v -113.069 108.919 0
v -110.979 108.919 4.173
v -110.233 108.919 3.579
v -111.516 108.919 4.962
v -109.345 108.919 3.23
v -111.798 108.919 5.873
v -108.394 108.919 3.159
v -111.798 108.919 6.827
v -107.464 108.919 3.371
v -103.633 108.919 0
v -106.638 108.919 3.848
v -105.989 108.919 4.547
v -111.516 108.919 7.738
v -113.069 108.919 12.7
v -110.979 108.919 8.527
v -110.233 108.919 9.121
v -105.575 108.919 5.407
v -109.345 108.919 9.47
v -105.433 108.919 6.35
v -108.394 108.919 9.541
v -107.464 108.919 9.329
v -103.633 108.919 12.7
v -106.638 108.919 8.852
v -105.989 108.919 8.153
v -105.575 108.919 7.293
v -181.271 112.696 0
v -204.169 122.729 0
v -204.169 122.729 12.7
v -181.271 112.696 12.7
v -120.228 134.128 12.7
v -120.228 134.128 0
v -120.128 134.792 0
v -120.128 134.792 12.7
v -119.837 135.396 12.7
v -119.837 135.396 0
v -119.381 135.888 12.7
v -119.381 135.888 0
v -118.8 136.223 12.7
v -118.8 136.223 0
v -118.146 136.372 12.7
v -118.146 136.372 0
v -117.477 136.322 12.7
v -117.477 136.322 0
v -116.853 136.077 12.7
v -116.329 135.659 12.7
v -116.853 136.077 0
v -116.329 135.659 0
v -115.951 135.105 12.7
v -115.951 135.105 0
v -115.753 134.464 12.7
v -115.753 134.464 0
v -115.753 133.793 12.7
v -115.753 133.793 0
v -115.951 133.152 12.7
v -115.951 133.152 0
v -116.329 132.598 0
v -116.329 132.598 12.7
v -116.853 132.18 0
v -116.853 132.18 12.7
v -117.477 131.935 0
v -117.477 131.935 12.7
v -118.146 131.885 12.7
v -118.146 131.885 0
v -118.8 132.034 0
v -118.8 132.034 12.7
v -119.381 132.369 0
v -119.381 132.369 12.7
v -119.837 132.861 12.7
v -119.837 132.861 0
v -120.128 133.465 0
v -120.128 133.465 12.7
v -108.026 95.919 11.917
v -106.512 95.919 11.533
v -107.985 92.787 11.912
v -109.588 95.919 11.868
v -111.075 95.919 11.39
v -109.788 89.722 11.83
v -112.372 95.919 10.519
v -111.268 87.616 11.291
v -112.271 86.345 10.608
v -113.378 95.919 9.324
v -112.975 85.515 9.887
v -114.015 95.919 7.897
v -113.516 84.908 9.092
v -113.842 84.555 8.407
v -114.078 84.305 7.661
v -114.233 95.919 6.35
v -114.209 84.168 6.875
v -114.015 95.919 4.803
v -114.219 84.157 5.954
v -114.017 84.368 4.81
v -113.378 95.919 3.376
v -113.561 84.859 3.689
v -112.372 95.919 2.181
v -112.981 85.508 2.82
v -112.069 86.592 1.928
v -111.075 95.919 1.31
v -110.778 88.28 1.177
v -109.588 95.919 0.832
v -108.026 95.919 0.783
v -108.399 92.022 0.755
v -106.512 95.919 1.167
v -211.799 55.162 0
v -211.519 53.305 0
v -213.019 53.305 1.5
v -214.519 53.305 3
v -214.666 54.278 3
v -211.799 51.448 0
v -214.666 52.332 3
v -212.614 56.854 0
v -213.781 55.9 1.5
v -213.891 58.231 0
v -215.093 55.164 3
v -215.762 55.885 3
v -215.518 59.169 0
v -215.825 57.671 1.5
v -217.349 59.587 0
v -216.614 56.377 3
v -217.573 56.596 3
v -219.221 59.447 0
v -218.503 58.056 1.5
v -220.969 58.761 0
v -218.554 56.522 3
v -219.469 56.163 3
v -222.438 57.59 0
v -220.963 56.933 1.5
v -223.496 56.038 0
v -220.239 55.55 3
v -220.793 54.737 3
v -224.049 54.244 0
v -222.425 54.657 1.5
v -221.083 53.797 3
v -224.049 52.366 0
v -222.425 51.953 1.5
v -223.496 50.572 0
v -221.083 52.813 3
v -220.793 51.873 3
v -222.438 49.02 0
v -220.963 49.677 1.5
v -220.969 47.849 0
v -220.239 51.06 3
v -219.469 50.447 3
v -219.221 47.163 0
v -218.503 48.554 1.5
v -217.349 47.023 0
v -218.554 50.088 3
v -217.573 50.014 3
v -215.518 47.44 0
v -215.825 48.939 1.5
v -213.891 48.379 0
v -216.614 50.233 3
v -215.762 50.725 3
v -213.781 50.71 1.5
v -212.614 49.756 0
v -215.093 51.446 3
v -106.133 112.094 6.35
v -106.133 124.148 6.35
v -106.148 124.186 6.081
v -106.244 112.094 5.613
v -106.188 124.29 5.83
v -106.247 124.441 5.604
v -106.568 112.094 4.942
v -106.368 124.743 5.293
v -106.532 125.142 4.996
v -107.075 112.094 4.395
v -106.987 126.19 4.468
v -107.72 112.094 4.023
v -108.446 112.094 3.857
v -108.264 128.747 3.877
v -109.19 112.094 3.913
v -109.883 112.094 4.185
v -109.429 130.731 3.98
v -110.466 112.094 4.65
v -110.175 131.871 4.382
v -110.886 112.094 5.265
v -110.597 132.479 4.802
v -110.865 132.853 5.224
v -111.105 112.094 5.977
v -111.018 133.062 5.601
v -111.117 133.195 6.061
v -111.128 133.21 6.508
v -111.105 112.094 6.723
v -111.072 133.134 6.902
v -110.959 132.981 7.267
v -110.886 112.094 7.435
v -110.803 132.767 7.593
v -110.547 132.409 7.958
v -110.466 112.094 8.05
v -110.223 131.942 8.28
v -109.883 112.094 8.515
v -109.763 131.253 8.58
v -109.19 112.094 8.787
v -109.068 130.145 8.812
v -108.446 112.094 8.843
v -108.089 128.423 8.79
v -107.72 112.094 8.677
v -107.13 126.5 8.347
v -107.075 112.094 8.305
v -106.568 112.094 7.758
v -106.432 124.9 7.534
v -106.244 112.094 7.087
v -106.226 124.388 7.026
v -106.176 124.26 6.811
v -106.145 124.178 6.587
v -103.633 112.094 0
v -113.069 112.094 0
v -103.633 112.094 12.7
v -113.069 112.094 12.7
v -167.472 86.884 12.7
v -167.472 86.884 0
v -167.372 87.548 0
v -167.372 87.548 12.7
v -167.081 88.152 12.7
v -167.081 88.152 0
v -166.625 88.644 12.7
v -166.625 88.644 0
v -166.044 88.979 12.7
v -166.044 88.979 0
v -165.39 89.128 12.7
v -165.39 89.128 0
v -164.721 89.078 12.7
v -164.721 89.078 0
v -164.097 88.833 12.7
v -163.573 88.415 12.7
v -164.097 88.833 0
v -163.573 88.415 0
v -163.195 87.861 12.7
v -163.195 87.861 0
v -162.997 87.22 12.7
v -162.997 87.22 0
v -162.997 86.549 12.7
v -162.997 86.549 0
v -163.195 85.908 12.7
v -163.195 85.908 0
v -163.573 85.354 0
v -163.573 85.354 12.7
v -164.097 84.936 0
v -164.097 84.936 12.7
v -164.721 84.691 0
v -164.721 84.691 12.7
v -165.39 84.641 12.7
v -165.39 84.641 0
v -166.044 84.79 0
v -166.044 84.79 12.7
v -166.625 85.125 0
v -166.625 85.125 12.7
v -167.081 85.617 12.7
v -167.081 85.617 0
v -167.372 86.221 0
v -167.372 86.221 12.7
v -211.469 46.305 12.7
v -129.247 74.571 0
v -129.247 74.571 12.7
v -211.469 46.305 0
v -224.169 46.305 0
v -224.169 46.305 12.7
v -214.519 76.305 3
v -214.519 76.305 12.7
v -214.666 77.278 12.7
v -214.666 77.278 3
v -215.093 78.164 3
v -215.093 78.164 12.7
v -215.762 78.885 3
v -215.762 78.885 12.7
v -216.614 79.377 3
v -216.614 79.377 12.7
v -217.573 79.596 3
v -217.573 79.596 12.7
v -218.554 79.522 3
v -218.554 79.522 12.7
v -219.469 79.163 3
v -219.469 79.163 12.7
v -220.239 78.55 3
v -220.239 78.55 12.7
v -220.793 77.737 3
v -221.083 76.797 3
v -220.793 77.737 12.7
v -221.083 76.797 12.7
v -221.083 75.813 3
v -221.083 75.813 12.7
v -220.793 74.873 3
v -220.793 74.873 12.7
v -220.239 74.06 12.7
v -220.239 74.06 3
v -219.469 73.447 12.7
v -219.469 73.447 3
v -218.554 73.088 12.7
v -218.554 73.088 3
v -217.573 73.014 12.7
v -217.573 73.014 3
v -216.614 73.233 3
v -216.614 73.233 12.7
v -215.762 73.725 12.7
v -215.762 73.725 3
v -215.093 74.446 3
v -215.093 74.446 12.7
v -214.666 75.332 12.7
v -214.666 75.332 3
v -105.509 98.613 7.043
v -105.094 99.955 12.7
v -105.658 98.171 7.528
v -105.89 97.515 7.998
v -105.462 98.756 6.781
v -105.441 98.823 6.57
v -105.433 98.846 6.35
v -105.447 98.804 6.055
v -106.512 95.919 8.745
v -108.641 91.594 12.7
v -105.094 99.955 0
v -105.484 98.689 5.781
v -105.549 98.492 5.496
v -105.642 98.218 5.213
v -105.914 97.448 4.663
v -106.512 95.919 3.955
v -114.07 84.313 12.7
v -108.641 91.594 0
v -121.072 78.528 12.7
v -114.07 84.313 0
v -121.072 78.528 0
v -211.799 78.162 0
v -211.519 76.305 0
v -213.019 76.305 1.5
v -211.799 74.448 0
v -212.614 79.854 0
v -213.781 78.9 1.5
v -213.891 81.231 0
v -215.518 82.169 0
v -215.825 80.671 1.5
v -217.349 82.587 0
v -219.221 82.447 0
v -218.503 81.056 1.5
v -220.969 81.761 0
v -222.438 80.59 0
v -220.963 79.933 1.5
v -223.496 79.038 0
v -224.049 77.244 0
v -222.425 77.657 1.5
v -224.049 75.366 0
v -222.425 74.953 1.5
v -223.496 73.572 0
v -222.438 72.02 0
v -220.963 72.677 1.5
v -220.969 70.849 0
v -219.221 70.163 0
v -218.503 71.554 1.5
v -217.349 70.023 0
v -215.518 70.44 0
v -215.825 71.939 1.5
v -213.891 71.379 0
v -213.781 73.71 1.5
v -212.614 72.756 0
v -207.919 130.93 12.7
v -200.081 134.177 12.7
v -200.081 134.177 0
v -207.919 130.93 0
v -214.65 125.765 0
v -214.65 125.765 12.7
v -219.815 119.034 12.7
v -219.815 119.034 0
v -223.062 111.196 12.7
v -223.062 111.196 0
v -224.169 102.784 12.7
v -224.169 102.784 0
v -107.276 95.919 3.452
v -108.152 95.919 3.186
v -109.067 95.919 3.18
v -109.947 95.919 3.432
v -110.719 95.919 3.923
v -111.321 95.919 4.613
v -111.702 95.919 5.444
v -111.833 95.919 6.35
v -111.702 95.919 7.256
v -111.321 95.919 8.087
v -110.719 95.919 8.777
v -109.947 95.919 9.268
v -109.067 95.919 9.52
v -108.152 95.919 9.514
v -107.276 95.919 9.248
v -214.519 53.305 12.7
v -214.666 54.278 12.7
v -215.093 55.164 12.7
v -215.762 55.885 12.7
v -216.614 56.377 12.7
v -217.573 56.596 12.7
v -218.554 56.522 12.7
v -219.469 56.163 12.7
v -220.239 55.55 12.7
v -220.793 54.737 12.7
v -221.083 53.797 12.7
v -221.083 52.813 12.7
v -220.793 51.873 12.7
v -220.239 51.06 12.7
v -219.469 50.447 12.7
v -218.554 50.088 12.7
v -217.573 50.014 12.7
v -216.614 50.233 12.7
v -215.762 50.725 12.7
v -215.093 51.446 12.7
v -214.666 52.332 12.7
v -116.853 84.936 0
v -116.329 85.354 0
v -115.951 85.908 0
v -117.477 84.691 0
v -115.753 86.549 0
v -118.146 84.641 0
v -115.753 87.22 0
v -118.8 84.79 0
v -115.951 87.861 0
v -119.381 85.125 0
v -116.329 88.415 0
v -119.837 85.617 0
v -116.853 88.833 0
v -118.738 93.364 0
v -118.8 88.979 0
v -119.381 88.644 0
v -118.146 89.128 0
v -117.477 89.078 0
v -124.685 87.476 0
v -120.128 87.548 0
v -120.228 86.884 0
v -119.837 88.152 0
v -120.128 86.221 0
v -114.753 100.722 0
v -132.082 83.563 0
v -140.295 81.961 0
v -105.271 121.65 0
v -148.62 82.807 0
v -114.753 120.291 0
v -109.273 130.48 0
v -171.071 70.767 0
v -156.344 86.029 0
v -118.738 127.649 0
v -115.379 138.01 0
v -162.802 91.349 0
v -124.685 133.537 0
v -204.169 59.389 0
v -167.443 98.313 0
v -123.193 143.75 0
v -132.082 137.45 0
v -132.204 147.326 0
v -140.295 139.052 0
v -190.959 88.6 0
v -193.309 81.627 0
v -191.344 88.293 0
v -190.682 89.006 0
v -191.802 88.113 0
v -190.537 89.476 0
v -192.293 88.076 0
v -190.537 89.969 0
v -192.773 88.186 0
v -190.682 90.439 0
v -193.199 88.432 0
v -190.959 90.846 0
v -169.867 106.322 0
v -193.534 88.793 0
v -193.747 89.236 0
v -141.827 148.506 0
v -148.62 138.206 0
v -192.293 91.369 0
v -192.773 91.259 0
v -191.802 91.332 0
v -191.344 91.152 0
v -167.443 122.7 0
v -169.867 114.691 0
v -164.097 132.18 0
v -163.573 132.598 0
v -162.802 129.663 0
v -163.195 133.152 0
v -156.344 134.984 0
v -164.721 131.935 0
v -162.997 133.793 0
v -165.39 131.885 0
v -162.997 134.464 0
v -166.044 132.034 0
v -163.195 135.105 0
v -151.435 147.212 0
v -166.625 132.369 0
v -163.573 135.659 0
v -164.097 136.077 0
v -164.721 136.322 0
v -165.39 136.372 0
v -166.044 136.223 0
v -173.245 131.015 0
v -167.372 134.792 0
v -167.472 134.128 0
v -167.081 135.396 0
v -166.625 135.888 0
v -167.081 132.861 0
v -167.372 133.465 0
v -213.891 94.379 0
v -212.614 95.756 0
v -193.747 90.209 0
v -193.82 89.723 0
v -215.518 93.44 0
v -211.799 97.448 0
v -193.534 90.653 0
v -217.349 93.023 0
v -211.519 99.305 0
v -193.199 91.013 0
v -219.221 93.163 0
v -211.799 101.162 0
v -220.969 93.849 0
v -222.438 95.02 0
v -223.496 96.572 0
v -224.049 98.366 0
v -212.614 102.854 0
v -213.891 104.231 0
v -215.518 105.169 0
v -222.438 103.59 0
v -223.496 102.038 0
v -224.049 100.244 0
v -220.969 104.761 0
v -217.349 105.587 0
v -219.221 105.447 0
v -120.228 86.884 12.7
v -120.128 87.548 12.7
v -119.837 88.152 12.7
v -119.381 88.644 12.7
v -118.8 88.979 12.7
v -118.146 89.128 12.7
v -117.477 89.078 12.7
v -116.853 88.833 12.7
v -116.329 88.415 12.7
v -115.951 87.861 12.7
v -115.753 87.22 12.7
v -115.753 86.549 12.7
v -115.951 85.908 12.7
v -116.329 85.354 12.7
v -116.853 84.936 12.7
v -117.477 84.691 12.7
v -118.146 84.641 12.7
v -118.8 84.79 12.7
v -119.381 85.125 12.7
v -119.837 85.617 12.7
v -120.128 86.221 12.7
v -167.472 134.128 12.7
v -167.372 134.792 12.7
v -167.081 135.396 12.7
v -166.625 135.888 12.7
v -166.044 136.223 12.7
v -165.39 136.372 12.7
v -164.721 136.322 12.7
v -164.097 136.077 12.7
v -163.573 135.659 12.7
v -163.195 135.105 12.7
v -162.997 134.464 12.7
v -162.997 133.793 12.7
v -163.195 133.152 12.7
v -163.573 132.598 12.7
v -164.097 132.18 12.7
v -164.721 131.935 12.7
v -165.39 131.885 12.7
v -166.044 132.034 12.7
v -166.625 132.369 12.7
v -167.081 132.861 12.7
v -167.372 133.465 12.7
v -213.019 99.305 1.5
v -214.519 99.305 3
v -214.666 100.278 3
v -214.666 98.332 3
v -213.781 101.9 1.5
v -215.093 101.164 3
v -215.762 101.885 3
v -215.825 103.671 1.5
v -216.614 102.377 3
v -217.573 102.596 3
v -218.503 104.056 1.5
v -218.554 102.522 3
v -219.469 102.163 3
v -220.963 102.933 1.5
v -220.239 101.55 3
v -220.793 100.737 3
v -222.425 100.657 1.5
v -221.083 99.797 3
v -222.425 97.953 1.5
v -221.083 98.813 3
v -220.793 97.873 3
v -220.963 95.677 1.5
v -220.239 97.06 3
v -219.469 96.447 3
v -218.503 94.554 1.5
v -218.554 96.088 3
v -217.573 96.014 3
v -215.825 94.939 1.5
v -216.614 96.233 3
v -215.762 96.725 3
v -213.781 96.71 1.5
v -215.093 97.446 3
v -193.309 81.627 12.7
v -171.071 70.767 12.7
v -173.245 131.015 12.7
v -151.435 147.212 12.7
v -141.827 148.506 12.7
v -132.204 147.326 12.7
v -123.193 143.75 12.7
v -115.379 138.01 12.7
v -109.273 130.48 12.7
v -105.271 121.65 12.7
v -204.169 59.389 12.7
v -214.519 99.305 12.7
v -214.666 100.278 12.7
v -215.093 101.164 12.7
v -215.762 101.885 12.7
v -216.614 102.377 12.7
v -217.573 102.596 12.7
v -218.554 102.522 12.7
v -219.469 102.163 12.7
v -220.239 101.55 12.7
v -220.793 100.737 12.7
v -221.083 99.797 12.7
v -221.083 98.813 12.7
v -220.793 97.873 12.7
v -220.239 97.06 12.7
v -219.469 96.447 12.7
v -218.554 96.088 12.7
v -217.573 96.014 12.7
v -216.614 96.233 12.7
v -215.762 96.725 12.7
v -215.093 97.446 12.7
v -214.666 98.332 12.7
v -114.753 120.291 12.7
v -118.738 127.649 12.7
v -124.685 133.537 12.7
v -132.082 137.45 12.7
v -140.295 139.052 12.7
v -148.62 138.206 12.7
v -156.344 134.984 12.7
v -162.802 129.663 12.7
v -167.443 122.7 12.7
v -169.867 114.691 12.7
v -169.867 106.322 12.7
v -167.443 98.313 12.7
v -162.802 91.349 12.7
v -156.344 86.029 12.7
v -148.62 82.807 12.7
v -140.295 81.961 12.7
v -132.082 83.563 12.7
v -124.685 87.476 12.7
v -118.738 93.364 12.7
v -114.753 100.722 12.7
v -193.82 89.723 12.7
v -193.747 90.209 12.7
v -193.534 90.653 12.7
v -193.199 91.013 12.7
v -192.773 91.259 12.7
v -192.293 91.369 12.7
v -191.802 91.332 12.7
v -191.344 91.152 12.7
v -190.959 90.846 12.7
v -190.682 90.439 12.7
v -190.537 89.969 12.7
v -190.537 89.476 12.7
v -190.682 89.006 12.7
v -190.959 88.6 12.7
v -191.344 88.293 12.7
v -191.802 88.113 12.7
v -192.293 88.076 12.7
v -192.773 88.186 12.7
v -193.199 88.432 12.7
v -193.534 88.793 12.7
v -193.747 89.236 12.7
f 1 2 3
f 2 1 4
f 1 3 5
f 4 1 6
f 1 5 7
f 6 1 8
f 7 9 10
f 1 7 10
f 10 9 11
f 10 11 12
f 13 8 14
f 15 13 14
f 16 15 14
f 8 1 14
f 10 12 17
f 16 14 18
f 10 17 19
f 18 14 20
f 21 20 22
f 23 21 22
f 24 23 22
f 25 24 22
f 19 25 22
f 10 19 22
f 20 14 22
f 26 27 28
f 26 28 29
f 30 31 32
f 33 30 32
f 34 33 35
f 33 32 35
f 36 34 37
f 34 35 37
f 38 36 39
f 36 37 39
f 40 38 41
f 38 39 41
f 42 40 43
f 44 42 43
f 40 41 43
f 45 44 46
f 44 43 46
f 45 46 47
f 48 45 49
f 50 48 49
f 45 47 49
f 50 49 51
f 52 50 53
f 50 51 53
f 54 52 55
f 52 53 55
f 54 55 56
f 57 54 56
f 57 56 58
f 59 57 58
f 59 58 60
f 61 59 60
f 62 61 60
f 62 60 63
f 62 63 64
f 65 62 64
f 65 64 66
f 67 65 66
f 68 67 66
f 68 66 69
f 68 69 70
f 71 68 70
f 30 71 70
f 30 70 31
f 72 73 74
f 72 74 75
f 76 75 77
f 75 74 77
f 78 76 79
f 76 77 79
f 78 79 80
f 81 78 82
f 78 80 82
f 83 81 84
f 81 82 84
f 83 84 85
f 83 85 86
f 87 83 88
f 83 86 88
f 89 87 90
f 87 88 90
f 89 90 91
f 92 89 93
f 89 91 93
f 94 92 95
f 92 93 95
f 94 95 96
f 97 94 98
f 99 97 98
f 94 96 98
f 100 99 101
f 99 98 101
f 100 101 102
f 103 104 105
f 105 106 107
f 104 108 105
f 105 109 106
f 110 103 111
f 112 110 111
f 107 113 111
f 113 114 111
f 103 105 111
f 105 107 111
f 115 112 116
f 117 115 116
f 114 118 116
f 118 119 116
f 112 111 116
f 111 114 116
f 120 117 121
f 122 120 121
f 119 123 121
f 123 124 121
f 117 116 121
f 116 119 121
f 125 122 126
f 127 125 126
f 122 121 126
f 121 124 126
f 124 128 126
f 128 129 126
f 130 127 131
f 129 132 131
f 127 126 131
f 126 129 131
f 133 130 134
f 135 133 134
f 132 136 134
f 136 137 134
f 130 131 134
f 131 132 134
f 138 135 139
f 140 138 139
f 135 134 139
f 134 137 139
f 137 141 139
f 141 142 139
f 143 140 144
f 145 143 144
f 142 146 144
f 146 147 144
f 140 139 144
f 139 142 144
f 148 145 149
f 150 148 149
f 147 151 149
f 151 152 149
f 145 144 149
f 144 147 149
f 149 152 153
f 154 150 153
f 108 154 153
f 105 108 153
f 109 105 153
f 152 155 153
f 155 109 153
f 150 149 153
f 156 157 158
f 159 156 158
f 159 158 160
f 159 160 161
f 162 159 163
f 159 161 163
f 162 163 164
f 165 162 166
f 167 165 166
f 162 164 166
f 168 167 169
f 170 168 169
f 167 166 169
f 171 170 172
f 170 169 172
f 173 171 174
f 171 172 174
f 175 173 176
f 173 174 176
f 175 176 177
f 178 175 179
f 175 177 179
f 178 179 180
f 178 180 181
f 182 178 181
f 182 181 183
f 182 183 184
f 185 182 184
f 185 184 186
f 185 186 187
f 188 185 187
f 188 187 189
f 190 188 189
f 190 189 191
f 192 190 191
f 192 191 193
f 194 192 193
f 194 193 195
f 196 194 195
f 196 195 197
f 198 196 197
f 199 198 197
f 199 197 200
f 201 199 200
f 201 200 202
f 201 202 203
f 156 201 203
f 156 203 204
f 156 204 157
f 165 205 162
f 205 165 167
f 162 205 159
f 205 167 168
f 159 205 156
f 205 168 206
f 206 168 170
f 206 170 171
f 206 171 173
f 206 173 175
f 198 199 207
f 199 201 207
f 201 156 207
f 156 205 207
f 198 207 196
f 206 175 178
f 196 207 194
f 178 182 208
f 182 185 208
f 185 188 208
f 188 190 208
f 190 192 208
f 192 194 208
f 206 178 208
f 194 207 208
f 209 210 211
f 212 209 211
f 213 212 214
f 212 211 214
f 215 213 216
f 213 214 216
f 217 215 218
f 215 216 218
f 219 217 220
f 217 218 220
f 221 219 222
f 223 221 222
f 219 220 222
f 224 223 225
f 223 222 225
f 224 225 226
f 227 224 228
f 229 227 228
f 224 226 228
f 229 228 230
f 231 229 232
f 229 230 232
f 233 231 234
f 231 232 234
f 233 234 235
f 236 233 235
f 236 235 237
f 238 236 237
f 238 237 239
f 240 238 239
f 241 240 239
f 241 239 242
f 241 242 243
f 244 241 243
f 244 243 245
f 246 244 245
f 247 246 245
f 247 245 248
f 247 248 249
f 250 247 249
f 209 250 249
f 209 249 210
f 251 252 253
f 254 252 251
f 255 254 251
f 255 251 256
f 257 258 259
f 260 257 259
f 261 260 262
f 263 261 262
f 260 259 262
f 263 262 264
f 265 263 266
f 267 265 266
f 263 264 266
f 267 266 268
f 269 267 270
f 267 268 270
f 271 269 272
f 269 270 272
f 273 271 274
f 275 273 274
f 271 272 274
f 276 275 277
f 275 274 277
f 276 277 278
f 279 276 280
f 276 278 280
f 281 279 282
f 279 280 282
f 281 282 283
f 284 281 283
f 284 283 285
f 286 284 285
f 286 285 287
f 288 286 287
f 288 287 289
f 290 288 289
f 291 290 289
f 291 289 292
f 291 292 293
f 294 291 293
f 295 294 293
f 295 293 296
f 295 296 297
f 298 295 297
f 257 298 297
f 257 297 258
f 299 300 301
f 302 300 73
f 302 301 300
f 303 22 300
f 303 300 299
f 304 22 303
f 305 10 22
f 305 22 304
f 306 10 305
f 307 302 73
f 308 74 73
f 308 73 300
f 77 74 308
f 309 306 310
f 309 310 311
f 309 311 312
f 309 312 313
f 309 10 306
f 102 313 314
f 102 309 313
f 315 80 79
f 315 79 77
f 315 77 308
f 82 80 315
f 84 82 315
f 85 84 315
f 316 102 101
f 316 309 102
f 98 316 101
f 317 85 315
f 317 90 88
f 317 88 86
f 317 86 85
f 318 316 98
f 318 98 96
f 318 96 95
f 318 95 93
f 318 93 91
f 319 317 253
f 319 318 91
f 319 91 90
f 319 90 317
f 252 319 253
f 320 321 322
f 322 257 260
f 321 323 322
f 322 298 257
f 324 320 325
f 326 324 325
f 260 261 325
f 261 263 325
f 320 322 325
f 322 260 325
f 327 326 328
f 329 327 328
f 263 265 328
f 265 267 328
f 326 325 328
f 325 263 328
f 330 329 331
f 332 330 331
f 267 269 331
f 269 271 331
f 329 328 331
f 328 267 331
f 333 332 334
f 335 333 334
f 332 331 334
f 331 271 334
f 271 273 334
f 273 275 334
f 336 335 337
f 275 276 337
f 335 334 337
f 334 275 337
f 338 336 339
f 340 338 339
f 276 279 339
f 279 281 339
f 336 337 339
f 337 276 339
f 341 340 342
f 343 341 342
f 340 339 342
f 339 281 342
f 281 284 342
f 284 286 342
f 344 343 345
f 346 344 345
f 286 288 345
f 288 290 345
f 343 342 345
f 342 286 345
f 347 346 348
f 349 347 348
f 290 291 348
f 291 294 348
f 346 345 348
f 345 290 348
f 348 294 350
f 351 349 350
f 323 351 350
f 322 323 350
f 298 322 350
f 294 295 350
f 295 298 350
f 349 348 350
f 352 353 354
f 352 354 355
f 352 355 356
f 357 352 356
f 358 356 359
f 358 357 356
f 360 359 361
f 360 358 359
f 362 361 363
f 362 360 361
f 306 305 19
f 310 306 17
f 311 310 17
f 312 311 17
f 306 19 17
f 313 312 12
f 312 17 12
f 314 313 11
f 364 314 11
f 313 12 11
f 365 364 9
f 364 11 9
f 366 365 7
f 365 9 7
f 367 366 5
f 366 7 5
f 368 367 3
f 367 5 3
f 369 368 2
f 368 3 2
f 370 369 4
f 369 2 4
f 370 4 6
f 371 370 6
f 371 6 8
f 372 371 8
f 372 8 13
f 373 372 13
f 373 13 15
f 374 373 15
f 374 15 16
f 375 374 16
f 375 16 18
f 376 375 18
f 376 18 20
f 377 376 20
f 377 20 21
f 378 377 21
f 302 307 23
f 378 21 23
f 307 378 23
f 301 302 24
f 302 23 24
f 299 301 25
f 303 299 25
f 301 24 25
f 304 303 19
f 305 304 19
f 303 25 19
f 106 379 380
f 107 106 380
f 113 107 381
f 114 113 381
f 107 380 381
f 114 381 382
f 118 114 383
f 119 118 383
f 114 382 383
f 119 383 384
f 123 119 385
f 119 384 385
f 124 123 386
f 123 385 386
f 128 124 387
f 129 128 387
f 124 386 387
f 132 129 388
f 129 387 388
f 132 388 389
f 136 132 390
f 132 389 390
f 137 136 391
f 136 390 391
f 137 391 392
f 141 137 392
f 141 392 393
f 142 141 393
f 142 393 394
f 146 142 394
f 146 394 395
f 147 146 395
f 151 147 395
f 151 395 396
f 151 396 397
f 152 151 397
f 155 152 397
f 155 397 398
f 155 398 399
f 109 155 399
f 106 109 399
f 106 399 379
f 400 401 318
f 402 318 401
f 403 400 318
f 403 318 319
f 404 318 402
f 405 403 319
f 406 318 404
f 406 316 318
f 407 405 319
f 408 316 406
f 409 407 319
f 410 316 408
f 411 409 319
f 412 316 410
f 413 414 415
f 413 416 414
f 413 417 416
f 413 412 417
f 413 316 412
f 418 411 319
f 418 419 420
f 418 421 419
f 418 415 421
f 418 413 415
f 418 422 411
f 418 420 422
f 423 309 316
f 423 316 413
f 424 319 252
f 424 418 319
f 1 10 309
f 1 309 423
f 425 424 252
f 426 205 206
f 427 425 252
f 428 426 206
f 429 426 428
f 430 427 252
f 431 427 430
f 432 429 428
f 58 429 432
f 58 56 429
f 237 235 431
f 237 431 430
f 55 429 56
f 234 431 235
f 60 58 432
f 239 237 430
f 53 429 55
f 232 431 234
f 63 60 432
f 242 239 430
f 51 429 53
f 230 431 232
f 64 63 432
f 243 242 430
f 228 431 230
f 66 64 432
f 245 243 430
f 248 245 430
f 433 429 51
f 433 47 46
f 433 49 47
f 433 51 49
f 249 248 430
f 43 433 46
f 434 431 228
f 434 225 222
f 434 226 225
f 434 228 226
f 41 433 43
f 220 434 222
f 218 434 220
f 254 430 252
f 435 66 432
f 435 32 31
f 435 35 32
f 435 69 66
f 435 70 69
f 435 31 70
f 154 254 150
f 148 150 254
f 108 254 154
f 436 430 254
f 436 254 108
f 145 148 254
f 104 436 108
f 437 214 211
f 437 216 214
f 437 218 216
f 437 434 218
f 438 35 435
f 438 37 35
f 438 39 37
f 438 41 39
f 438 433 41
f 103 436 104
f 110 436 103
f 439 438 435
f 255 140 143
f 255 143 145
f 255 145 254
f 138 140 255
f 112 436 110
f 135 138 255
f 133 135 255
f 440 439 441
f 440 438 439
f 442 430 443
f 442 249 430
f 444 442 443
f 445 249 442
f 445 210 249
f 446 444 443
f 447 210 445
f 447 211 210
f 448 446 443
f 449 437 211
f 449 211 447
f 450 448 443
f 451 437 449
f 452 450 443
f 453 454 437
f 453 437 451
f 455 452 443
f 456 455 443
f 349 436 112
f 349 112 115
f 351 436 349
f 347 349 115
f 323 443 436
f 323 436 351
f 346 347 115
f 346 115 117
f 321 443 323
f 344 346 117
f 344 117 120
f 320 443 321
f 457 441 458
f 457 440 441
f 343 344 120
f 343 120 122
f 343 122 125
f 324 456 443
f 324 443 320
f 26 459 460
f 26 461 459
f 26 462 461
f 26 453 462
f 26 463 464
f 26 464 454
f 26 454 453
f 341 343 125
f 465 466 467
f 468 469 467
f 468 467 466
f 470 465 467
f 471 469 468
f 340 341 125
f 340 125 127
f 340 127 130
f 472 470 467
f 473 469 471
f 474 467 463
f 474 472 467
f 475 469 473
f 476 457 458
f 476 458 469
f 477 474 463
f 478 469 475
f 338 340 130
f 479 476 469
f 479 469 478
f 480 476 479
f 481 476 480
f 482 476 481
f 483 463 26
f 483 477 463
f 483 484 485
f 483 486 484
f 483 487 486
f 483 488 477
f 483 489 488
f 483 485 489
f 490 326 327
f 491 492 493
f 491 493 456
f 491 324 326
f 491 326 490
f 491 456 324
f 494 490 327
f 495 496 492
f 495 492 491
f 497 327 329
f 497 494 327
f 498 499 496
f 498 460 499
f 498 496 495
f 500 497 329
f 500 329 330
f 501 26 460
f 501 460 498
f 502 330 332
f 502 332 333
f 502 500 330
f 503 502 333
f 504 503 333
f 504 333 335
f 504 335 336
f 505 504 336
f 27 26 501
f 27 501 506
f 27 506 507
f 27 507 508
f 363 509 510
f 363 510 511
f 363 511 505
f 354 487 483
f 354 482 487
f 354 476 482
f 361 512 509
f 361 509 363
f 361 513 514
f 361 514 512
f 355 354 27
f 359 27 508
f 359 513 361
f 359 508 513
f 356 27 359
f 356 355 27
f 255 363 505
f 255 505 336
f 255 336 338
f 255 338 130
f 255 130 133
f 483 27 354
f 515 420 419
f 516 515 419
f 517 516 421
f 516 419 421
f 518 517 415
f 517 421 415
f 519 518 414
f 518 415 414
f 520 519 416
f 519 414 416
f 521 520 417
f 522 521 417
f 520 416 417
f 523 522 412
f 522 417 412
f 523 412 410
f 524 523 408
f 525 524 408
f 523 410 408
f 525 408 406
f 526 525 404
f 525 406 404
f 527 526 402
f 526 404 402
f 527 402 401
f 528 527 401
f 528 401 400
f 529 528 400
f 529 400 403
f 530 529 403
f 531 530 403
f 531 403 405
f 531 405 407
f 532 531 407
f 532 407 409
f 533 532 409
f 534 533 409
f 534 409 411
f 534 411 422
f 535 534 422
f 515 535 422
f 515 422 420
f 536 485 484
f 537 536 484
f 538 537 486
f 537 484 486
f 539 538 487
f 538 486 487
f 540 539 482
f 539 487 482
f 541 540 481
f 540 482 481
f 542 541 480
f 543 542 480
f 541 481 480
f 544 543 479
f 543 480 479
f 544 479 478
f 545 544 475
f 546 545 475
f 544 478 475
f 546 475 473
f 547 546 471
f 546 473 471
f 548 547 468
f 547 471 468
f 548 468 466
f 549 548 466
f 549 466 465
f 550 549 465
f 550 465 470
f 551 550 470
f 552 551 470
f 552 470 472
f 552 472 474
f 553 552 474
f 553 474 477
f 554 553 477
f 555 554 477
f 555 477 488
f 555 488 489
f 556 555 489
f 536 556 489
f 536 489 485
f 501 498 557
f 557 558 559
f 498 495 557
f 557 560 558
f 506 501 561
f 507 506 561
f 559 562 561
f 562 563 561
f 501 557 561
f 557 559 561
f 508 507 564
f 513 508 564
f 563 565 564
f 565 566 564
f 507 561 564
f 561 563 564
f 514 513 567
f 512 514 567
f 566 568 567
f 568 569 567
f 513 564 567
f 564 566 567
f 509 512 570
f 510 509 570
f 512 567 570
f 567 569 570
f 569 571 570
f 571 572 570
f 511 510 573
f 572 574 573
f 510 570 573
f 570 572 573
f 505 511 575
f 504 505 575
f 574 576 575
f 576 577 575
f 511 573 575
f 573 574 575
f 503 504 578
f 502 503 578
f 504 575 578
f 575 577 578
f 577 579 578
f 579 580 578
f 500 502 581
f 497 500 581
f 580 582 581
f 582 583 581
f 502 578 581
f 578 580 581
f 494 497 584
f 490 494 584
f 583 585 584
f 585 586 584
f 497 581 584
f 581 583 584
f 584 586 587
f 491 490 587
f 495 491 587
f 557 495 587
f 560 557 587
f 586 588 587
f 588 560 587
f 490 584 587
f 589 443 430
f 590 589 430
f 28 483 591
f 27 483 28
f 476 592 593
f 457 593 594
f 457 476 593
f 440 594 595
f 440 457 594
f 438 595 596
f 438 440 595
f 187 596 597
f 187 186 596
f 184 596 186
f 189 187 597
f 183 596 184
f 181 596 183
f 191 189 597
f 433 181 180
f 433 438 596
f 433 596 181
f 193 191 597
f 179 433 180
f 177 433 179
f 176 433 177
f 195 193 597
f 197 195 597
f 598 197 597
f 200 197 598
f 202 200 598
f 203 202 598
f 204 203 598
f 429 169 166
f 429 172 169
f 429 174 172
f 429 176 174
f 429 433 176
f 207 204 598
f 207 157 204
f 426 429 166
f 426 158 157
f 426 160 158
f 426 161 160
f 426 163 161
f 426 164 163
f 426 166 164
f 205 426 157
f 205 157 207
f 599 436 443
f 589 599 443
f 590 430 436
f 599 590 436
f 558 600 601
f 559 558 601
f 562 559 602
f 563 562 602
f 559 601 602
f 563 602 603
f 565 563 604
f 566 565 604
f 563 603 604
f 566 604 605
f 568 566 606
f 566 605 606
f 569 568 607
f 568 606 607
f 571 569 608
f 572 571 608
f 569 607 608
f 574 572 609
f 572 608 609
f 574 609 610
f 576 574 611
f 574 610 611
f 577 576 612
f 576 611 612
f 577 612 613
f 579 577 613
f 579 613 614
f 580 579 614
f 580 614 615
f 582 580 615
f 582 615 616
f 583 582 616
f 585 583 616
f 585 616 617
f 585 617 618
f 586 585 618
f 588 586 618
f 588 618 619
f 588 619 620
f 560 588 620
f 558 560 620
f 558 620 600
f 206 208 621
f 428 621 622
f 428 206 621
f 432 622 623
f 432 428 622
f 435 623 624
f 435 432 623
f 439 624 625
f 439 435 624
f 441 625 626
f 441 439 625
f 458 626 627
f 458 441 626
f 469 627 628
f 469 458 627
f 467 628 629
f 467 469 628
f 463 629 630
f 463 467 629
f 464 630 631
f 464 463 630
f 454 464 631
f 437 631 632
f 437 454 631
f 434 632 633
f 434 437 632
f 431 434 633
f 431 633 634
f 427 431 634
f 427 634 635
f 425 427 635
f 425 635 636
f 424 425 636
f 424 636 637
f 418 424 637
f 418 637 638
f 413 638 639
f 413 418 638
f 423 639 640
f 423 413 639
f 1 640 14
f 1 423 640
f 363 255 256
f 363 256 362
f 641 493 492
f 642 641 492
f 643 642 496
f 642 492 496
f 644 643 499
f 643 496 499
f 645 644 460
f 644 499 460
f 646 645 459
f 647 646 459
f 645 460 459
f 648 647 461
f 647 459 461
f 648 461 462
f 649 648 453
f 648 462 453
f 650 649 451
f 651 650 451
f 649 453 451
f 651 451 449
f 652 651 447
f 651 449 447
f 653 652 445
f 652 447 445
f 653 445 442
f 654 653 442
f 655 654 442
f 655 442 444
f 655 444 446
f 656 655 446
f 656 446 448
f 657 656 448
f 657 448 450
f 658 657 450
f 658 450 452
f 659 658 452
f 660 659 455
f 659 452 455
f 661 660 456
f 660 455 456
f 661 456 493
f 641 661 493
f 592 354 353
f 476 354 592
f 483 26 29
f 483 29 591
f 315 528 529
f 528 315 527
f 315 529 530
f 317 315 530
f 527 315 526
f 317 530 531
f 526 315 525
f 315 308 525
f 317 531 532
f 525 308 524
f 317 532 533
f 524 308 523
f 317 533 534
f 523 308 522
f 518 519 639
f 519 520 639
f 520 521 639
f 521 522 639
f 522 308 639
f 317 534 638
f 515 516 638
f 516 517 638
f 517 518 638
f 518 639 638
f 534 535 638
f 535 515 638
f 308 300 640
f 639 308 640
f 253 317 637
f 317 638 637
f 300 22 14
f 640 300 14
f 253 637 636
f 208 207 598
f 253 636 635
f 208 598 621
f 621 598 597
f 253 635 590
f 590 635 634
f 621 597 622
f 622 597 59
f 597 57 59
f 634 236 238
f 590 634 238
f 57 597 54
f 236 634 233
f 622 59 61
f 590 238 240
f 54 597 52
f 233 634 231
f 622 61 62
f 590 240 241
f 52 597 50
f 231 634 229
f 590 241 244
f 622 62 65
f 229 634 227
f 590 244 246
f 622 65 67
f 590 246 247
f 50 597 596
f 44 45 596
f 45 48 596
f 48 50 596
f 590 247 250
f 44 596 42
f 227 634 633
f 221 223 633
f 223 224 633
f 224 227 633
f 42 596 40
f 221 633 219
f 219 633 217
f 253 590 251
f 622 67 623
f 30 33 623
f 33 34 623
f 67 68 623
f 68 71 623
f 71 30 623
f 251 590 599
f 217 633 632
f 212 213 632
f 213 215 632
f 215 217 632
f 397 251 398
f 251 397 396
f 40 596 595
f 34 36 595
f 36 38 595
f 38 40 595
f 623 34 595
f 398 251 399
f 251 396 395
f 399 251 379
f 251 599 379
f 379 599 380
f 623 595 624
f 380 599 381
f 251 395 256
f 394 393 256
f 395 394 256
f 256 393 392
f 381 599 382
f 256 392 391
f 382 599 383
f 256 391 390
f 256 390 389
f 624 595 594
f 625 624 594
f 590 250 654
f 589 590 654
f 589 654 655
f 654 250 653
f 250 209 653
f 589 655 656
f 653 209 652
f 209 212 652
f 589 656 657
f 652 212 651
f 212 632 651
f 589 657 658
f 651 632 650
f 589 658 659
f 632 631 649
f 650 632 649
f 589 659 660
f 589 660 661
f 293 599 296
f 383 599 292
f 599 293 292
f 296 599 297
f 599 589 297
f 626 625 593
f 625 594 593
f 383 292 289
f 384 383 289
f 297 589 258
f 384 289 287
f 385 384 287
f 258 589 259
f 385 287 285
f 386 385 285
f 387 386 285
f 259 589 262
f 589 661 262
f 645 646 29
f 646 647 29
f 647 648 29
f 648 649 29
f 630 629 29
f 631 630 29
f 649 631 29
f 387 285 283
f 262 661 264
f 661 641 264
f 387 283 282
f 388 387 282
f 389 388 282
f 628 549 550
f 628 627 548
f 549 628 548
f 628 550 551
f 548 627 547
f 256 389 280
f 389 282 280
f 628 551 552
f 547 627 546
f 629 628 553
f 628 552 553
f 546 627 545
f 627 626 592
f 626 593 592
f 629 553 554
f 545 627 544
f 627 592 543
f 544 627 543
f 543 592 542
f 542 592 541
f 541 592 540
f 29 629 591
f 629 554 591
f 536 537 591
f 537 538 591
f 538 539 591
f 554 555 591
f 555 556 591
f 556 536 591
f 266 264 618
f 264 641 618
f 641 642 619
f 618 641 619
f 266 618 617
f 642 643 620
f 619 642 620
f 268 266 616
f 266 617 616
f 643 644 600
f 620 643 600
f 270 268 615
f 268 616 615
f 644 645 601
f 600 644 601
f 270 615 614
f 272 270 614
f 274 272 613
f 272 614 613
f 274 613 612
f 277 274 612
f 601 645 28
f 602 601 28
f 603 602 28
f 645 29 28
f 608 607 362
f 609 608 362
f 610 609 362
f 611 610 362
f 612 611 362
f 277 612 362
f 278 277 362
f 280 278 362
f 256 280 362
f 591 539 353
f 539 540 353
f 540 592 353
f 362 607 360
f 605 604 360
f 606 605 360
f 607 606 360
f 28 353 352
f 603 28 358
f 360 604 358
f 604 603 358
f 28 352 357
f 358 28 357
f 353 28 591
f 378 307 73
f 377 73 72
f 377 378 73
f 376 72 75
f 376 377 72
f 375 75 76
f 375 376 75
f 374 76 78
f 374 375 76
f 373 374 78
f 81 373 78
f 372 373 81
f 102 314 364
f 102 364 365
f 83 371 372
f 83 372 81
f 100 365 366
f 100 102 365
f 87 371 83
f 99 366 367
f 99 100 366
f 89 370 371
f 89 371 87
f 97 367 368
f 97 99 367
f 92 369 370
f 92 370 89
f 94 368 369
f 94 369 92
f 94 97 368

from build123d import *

# Parameters (mm, degrees)
BOSS_EXTRUDE1_DEPTH        = 12.7
CUT_EXTRUDE1_DEPTH         = 270.1976912701424
F_8_CLEARANCE_HOLE1_D      = 4.5
F_1_4_CLEARANCE_HOLE1_D    = 6.6
F_12_CLEARANCE_HOLE1_D     = 6
HOLE1_D                    = 6.4
HOLE1_DEPTH                = 24.77643101
HOLE1_CBORE_D              = 11.2
HOLE1_CBORE_DEPTH          = 11.77643101
F_10_CLEARANCE_HOLE1_D     = 5
F_10_CLEARANCE_HOLE1_DEPTH = 36.4125
CHAMFER1_SIZE              = 3.0000000000270917
SKETCH14_R                 = 2.9999999999999645
SKETCH14_R_2               = 1.6510000000000182
BOSS_EXTRUDE2_DEPTH        = 12.7
FILLET_1_R                 = 10
CUT_EXTRUDE_1_DEPTH        = 270.1976913300265
CUT_EXTRUDE_1_DEPTH_BACK   = 270.1976913300265
CUT_EXTRUDE_2_DEPTH        = 270.1976913300265


with BuildPart() as part:
    # Sketch1 → Boss-Extrude1 (new body)
    with BuildSketch(Plane(origin=(0, 0, 0), x_dir=(-1, 0, 0), z_dir=(0, 0, -1))):
        with BuildLine():
            Line((224.16945546503186, 127.72254562005153), (151.435240745465, 147.21161971627112))
            ThreePointArc((151.435240745465, 147.21161971627112), (105.25775385063858, 121.60745801933766), (129.24653278741587, 74.57053765621215))
            Line((129.24653278741587, 74.57053765621215), (211.46945546503187, 46.304993077870854))
            Line((211.46945546503187, 46.304993077870854), (224.16945546503186, 46.304993077870854))
            Line((224.16945546503186, 46.304993077870854), (224.16945546503186, 127.72254562005153))
        make_face()
    extrude(amount=-BOSS_EXTRUDE1_DEPTH)

    # Sketch2 → Cut-Extrude1 (cut, through all)
    with BuildSketch(Plane.XY.offset(12.7)):
        with BuildLine():
            Line((-103.63329146305492, 112.0939383172865), (-113.17901851462243, 112.0939383172865))
            ThreePointArc((-113.17901851462243, 112.0939383172865), (-113.13471703156931, 110.50643831728651), (-113.17901851462243, 108.9189383172865))
            Line((-113.17901851462243, 108.9189383172865), (-103.6332914630549, 108.91893831728652))
            ThreePointArc((-103.6332914630549, 108.91893831728652), (-103.60011703156931, 110.50643831728651), (-103.63329146305492, 112.0939383172865))
        make_face()
    extrude(amount=-CUT_EXTRUDE1_DEPTH, mode=Mode.SUBTRACT)

    # Sketch3 → Cut-Revolve1 (revolve, cut)
    with BuildSketch(Plane(origin=(0, 110.50643831728648, 0), x_dir=(1, 0, 0), z_dir=(0, 1, 0))):
        Polygon((-113.02511703156932, 3.5e-15), (-141.60011703156934, 0), (-141.60011703156934, -12.7), (-113.02511703156932, -12.7), align=None)
    revolve(axis=Axis((-141.60011703156934, 110.50643831728648, 0), (0, 0, 1)), mode=Mode.SUBTRACT)

    # #8 Clearance Hole1 (through all)
    with Locations(Plane.XY.offset(12.7)):
        with Locations((-117.978117032, 86.884438317), (-165.222117032, 86.884438317), (-165.222117032, 134.128438317), (-117.978117032, 134.128438317)):
            Hole(F_8_CLEARANCE_HOLE1_D / 2)

    # 1/4 Clearance Hole1 (through all)
    with Locations(Plane(origin=(0, 0, 0), x_dir=(-1, 0, 0), z_dir=(0, 0, -1))):
        with Locations((217.819455465, 53.304993078), (217.819455465, 76.304993078), (217.819455465, 99.304993078)):
            Hole(F_1_4_CLEARANCE_HOLE1_D / 2)

    # #12 Clearance Hole1 (through all)
    with Locations(Plane.XY.offset(12.7)):
        with Locations((-192.169455465, 89.72254562)):
            Hole(F_12_CLEARANCE_HOLE1_D / 2)

    # Hole1
    with Locations(Plane(origin=(0, 84.14250730723957, 0), x_dir=(-1, 0, 0), z_dir=(0, -1, 0))):
        with Locations((108.633291463, -6.35)):
            CounterBoreHole(HOLE1_D / 2, HOLE1_CBORE_D / 2, HOLE1_CBORE_DEPTH, depth=HOLE1_DEPTH)

    # #10 Clearance Hole1
    with Locations(Plane(origin=(0, 112.0939383172865, 0), x_dir=(-1, 0, 0), z_dir=(0, -1, 0))):
        with Locations((108.633291463, -6.35)):
            Hole(F_10_CLEARANCE_HOLE1_D / 2, depth=F_10_CLEARANCE_HOLE1_DEPTH)

    # Chamfer1
    chamfer1_edges = [part.edges().sort_by_distance(p)[0] for p in [
        (-221.11945546500002, 99.304993078, 0),
        (-221.11945546500002, 76.304993078, 0),
        (-221.11945546500002, 53.304993078, 0),
    ]]
    chamfer(chamfer1_edges, length=CHAMFER1_SIZE)

    # Sketch14 → Boss-Extrude2 (add)
    with BuildSketch(Plane(origin=(0, 0, 0), x_dir=(-1, 0, 0), z_dir=(0, 0, -1))):
        with Locations((192.16945546503186, 89.72254562005152)):
            Circle(SKETCH14_R)
        with Locations((192.16945546503186, 89.72254562005152)):
            Circle(SKETCH14_R_2, mode=Mode.SUBTRACT)
    extrude(amount=-BOSS_EXTRUDE2_DEPTH)

    # 圆角1
    fillet_1_edges = [part.edges().sort_by_distance(p)[0] for p in [
        (-224.16945546503186, 127.72254562005153, 6.35),
    ]]
    fillet(fillet_1_edges, radius=FILLET_1_R)

    # 草图1 → 切除-拉伸1 (cut, two sides: drawn at the far end of the back side and taken through both)
    with BuildSketch(Plane(origin=(0, 0, 0), x_dir=(-1, 0, 0), z_dir=(0, 0, -1)).offset(-CUT_EXTRUDE_1_DEPTH_BACK)):
        with BuildLine():
            Line((499.3977697015972, 53.97534108618588), (216.75764591605704, 129.7085340031526))
            Line((216.75764591605704, 129.7085340031526), (200.08107443086368, 134.17700786512998))
            ThreePointArc((200.08107443086368, 134.17700786512998), (217.45343902449696, 122.56916495351871), (224.16945546503186, 102.78441851073525))
            Line((224.16945546503186, 102.78441851073525), (224.16945546503186, 120.04927574026192))
            Line((224.16945546503186, 120.04927574026192), (224.16945546503186, 412.65986352358874))
            Line((224.16945546503186, 412.65986352358874), (-240.11771897993546, 56.399784399468274))
            Line((-240.11771897993546, 56.399784399468274), (35.11059525662989, -302.2847380379346))
            Line((35.11059525662989, -302.2847380379346), (499.3977697015972, 53.97534108618588))
        make_face()
    extrude(amount=CUT_EXTRUDE_1_DEPTH + CUT_EXTRUDE_1_DEPTH_BACK, mode=Mode.SUBTRACT)

    # 草图2 → 切除-拉伸2 (cut, through all)
    with BuildSketch(Plane(origin=(0, 0, 0), x_dir=(-1, 0, 0), z_dir=(0, 0, -1))):
        Polygon((171.07059959298968, 70.76717861409958), (204.1694554650319, 59.388877336589836), (193.30917816776565, 81.6274559113658), align=None)
        Polygon((181.27084732320867, 112.69613365514031), (173.24474011566244, 131.01502016859888), (204.1694554650319, 122.72876766457311), align=None)
    extrude(amount=-CUT_EXTRUDE_2_DEPTH, mode=Mode.SUBTRACT)


solid = part.part
